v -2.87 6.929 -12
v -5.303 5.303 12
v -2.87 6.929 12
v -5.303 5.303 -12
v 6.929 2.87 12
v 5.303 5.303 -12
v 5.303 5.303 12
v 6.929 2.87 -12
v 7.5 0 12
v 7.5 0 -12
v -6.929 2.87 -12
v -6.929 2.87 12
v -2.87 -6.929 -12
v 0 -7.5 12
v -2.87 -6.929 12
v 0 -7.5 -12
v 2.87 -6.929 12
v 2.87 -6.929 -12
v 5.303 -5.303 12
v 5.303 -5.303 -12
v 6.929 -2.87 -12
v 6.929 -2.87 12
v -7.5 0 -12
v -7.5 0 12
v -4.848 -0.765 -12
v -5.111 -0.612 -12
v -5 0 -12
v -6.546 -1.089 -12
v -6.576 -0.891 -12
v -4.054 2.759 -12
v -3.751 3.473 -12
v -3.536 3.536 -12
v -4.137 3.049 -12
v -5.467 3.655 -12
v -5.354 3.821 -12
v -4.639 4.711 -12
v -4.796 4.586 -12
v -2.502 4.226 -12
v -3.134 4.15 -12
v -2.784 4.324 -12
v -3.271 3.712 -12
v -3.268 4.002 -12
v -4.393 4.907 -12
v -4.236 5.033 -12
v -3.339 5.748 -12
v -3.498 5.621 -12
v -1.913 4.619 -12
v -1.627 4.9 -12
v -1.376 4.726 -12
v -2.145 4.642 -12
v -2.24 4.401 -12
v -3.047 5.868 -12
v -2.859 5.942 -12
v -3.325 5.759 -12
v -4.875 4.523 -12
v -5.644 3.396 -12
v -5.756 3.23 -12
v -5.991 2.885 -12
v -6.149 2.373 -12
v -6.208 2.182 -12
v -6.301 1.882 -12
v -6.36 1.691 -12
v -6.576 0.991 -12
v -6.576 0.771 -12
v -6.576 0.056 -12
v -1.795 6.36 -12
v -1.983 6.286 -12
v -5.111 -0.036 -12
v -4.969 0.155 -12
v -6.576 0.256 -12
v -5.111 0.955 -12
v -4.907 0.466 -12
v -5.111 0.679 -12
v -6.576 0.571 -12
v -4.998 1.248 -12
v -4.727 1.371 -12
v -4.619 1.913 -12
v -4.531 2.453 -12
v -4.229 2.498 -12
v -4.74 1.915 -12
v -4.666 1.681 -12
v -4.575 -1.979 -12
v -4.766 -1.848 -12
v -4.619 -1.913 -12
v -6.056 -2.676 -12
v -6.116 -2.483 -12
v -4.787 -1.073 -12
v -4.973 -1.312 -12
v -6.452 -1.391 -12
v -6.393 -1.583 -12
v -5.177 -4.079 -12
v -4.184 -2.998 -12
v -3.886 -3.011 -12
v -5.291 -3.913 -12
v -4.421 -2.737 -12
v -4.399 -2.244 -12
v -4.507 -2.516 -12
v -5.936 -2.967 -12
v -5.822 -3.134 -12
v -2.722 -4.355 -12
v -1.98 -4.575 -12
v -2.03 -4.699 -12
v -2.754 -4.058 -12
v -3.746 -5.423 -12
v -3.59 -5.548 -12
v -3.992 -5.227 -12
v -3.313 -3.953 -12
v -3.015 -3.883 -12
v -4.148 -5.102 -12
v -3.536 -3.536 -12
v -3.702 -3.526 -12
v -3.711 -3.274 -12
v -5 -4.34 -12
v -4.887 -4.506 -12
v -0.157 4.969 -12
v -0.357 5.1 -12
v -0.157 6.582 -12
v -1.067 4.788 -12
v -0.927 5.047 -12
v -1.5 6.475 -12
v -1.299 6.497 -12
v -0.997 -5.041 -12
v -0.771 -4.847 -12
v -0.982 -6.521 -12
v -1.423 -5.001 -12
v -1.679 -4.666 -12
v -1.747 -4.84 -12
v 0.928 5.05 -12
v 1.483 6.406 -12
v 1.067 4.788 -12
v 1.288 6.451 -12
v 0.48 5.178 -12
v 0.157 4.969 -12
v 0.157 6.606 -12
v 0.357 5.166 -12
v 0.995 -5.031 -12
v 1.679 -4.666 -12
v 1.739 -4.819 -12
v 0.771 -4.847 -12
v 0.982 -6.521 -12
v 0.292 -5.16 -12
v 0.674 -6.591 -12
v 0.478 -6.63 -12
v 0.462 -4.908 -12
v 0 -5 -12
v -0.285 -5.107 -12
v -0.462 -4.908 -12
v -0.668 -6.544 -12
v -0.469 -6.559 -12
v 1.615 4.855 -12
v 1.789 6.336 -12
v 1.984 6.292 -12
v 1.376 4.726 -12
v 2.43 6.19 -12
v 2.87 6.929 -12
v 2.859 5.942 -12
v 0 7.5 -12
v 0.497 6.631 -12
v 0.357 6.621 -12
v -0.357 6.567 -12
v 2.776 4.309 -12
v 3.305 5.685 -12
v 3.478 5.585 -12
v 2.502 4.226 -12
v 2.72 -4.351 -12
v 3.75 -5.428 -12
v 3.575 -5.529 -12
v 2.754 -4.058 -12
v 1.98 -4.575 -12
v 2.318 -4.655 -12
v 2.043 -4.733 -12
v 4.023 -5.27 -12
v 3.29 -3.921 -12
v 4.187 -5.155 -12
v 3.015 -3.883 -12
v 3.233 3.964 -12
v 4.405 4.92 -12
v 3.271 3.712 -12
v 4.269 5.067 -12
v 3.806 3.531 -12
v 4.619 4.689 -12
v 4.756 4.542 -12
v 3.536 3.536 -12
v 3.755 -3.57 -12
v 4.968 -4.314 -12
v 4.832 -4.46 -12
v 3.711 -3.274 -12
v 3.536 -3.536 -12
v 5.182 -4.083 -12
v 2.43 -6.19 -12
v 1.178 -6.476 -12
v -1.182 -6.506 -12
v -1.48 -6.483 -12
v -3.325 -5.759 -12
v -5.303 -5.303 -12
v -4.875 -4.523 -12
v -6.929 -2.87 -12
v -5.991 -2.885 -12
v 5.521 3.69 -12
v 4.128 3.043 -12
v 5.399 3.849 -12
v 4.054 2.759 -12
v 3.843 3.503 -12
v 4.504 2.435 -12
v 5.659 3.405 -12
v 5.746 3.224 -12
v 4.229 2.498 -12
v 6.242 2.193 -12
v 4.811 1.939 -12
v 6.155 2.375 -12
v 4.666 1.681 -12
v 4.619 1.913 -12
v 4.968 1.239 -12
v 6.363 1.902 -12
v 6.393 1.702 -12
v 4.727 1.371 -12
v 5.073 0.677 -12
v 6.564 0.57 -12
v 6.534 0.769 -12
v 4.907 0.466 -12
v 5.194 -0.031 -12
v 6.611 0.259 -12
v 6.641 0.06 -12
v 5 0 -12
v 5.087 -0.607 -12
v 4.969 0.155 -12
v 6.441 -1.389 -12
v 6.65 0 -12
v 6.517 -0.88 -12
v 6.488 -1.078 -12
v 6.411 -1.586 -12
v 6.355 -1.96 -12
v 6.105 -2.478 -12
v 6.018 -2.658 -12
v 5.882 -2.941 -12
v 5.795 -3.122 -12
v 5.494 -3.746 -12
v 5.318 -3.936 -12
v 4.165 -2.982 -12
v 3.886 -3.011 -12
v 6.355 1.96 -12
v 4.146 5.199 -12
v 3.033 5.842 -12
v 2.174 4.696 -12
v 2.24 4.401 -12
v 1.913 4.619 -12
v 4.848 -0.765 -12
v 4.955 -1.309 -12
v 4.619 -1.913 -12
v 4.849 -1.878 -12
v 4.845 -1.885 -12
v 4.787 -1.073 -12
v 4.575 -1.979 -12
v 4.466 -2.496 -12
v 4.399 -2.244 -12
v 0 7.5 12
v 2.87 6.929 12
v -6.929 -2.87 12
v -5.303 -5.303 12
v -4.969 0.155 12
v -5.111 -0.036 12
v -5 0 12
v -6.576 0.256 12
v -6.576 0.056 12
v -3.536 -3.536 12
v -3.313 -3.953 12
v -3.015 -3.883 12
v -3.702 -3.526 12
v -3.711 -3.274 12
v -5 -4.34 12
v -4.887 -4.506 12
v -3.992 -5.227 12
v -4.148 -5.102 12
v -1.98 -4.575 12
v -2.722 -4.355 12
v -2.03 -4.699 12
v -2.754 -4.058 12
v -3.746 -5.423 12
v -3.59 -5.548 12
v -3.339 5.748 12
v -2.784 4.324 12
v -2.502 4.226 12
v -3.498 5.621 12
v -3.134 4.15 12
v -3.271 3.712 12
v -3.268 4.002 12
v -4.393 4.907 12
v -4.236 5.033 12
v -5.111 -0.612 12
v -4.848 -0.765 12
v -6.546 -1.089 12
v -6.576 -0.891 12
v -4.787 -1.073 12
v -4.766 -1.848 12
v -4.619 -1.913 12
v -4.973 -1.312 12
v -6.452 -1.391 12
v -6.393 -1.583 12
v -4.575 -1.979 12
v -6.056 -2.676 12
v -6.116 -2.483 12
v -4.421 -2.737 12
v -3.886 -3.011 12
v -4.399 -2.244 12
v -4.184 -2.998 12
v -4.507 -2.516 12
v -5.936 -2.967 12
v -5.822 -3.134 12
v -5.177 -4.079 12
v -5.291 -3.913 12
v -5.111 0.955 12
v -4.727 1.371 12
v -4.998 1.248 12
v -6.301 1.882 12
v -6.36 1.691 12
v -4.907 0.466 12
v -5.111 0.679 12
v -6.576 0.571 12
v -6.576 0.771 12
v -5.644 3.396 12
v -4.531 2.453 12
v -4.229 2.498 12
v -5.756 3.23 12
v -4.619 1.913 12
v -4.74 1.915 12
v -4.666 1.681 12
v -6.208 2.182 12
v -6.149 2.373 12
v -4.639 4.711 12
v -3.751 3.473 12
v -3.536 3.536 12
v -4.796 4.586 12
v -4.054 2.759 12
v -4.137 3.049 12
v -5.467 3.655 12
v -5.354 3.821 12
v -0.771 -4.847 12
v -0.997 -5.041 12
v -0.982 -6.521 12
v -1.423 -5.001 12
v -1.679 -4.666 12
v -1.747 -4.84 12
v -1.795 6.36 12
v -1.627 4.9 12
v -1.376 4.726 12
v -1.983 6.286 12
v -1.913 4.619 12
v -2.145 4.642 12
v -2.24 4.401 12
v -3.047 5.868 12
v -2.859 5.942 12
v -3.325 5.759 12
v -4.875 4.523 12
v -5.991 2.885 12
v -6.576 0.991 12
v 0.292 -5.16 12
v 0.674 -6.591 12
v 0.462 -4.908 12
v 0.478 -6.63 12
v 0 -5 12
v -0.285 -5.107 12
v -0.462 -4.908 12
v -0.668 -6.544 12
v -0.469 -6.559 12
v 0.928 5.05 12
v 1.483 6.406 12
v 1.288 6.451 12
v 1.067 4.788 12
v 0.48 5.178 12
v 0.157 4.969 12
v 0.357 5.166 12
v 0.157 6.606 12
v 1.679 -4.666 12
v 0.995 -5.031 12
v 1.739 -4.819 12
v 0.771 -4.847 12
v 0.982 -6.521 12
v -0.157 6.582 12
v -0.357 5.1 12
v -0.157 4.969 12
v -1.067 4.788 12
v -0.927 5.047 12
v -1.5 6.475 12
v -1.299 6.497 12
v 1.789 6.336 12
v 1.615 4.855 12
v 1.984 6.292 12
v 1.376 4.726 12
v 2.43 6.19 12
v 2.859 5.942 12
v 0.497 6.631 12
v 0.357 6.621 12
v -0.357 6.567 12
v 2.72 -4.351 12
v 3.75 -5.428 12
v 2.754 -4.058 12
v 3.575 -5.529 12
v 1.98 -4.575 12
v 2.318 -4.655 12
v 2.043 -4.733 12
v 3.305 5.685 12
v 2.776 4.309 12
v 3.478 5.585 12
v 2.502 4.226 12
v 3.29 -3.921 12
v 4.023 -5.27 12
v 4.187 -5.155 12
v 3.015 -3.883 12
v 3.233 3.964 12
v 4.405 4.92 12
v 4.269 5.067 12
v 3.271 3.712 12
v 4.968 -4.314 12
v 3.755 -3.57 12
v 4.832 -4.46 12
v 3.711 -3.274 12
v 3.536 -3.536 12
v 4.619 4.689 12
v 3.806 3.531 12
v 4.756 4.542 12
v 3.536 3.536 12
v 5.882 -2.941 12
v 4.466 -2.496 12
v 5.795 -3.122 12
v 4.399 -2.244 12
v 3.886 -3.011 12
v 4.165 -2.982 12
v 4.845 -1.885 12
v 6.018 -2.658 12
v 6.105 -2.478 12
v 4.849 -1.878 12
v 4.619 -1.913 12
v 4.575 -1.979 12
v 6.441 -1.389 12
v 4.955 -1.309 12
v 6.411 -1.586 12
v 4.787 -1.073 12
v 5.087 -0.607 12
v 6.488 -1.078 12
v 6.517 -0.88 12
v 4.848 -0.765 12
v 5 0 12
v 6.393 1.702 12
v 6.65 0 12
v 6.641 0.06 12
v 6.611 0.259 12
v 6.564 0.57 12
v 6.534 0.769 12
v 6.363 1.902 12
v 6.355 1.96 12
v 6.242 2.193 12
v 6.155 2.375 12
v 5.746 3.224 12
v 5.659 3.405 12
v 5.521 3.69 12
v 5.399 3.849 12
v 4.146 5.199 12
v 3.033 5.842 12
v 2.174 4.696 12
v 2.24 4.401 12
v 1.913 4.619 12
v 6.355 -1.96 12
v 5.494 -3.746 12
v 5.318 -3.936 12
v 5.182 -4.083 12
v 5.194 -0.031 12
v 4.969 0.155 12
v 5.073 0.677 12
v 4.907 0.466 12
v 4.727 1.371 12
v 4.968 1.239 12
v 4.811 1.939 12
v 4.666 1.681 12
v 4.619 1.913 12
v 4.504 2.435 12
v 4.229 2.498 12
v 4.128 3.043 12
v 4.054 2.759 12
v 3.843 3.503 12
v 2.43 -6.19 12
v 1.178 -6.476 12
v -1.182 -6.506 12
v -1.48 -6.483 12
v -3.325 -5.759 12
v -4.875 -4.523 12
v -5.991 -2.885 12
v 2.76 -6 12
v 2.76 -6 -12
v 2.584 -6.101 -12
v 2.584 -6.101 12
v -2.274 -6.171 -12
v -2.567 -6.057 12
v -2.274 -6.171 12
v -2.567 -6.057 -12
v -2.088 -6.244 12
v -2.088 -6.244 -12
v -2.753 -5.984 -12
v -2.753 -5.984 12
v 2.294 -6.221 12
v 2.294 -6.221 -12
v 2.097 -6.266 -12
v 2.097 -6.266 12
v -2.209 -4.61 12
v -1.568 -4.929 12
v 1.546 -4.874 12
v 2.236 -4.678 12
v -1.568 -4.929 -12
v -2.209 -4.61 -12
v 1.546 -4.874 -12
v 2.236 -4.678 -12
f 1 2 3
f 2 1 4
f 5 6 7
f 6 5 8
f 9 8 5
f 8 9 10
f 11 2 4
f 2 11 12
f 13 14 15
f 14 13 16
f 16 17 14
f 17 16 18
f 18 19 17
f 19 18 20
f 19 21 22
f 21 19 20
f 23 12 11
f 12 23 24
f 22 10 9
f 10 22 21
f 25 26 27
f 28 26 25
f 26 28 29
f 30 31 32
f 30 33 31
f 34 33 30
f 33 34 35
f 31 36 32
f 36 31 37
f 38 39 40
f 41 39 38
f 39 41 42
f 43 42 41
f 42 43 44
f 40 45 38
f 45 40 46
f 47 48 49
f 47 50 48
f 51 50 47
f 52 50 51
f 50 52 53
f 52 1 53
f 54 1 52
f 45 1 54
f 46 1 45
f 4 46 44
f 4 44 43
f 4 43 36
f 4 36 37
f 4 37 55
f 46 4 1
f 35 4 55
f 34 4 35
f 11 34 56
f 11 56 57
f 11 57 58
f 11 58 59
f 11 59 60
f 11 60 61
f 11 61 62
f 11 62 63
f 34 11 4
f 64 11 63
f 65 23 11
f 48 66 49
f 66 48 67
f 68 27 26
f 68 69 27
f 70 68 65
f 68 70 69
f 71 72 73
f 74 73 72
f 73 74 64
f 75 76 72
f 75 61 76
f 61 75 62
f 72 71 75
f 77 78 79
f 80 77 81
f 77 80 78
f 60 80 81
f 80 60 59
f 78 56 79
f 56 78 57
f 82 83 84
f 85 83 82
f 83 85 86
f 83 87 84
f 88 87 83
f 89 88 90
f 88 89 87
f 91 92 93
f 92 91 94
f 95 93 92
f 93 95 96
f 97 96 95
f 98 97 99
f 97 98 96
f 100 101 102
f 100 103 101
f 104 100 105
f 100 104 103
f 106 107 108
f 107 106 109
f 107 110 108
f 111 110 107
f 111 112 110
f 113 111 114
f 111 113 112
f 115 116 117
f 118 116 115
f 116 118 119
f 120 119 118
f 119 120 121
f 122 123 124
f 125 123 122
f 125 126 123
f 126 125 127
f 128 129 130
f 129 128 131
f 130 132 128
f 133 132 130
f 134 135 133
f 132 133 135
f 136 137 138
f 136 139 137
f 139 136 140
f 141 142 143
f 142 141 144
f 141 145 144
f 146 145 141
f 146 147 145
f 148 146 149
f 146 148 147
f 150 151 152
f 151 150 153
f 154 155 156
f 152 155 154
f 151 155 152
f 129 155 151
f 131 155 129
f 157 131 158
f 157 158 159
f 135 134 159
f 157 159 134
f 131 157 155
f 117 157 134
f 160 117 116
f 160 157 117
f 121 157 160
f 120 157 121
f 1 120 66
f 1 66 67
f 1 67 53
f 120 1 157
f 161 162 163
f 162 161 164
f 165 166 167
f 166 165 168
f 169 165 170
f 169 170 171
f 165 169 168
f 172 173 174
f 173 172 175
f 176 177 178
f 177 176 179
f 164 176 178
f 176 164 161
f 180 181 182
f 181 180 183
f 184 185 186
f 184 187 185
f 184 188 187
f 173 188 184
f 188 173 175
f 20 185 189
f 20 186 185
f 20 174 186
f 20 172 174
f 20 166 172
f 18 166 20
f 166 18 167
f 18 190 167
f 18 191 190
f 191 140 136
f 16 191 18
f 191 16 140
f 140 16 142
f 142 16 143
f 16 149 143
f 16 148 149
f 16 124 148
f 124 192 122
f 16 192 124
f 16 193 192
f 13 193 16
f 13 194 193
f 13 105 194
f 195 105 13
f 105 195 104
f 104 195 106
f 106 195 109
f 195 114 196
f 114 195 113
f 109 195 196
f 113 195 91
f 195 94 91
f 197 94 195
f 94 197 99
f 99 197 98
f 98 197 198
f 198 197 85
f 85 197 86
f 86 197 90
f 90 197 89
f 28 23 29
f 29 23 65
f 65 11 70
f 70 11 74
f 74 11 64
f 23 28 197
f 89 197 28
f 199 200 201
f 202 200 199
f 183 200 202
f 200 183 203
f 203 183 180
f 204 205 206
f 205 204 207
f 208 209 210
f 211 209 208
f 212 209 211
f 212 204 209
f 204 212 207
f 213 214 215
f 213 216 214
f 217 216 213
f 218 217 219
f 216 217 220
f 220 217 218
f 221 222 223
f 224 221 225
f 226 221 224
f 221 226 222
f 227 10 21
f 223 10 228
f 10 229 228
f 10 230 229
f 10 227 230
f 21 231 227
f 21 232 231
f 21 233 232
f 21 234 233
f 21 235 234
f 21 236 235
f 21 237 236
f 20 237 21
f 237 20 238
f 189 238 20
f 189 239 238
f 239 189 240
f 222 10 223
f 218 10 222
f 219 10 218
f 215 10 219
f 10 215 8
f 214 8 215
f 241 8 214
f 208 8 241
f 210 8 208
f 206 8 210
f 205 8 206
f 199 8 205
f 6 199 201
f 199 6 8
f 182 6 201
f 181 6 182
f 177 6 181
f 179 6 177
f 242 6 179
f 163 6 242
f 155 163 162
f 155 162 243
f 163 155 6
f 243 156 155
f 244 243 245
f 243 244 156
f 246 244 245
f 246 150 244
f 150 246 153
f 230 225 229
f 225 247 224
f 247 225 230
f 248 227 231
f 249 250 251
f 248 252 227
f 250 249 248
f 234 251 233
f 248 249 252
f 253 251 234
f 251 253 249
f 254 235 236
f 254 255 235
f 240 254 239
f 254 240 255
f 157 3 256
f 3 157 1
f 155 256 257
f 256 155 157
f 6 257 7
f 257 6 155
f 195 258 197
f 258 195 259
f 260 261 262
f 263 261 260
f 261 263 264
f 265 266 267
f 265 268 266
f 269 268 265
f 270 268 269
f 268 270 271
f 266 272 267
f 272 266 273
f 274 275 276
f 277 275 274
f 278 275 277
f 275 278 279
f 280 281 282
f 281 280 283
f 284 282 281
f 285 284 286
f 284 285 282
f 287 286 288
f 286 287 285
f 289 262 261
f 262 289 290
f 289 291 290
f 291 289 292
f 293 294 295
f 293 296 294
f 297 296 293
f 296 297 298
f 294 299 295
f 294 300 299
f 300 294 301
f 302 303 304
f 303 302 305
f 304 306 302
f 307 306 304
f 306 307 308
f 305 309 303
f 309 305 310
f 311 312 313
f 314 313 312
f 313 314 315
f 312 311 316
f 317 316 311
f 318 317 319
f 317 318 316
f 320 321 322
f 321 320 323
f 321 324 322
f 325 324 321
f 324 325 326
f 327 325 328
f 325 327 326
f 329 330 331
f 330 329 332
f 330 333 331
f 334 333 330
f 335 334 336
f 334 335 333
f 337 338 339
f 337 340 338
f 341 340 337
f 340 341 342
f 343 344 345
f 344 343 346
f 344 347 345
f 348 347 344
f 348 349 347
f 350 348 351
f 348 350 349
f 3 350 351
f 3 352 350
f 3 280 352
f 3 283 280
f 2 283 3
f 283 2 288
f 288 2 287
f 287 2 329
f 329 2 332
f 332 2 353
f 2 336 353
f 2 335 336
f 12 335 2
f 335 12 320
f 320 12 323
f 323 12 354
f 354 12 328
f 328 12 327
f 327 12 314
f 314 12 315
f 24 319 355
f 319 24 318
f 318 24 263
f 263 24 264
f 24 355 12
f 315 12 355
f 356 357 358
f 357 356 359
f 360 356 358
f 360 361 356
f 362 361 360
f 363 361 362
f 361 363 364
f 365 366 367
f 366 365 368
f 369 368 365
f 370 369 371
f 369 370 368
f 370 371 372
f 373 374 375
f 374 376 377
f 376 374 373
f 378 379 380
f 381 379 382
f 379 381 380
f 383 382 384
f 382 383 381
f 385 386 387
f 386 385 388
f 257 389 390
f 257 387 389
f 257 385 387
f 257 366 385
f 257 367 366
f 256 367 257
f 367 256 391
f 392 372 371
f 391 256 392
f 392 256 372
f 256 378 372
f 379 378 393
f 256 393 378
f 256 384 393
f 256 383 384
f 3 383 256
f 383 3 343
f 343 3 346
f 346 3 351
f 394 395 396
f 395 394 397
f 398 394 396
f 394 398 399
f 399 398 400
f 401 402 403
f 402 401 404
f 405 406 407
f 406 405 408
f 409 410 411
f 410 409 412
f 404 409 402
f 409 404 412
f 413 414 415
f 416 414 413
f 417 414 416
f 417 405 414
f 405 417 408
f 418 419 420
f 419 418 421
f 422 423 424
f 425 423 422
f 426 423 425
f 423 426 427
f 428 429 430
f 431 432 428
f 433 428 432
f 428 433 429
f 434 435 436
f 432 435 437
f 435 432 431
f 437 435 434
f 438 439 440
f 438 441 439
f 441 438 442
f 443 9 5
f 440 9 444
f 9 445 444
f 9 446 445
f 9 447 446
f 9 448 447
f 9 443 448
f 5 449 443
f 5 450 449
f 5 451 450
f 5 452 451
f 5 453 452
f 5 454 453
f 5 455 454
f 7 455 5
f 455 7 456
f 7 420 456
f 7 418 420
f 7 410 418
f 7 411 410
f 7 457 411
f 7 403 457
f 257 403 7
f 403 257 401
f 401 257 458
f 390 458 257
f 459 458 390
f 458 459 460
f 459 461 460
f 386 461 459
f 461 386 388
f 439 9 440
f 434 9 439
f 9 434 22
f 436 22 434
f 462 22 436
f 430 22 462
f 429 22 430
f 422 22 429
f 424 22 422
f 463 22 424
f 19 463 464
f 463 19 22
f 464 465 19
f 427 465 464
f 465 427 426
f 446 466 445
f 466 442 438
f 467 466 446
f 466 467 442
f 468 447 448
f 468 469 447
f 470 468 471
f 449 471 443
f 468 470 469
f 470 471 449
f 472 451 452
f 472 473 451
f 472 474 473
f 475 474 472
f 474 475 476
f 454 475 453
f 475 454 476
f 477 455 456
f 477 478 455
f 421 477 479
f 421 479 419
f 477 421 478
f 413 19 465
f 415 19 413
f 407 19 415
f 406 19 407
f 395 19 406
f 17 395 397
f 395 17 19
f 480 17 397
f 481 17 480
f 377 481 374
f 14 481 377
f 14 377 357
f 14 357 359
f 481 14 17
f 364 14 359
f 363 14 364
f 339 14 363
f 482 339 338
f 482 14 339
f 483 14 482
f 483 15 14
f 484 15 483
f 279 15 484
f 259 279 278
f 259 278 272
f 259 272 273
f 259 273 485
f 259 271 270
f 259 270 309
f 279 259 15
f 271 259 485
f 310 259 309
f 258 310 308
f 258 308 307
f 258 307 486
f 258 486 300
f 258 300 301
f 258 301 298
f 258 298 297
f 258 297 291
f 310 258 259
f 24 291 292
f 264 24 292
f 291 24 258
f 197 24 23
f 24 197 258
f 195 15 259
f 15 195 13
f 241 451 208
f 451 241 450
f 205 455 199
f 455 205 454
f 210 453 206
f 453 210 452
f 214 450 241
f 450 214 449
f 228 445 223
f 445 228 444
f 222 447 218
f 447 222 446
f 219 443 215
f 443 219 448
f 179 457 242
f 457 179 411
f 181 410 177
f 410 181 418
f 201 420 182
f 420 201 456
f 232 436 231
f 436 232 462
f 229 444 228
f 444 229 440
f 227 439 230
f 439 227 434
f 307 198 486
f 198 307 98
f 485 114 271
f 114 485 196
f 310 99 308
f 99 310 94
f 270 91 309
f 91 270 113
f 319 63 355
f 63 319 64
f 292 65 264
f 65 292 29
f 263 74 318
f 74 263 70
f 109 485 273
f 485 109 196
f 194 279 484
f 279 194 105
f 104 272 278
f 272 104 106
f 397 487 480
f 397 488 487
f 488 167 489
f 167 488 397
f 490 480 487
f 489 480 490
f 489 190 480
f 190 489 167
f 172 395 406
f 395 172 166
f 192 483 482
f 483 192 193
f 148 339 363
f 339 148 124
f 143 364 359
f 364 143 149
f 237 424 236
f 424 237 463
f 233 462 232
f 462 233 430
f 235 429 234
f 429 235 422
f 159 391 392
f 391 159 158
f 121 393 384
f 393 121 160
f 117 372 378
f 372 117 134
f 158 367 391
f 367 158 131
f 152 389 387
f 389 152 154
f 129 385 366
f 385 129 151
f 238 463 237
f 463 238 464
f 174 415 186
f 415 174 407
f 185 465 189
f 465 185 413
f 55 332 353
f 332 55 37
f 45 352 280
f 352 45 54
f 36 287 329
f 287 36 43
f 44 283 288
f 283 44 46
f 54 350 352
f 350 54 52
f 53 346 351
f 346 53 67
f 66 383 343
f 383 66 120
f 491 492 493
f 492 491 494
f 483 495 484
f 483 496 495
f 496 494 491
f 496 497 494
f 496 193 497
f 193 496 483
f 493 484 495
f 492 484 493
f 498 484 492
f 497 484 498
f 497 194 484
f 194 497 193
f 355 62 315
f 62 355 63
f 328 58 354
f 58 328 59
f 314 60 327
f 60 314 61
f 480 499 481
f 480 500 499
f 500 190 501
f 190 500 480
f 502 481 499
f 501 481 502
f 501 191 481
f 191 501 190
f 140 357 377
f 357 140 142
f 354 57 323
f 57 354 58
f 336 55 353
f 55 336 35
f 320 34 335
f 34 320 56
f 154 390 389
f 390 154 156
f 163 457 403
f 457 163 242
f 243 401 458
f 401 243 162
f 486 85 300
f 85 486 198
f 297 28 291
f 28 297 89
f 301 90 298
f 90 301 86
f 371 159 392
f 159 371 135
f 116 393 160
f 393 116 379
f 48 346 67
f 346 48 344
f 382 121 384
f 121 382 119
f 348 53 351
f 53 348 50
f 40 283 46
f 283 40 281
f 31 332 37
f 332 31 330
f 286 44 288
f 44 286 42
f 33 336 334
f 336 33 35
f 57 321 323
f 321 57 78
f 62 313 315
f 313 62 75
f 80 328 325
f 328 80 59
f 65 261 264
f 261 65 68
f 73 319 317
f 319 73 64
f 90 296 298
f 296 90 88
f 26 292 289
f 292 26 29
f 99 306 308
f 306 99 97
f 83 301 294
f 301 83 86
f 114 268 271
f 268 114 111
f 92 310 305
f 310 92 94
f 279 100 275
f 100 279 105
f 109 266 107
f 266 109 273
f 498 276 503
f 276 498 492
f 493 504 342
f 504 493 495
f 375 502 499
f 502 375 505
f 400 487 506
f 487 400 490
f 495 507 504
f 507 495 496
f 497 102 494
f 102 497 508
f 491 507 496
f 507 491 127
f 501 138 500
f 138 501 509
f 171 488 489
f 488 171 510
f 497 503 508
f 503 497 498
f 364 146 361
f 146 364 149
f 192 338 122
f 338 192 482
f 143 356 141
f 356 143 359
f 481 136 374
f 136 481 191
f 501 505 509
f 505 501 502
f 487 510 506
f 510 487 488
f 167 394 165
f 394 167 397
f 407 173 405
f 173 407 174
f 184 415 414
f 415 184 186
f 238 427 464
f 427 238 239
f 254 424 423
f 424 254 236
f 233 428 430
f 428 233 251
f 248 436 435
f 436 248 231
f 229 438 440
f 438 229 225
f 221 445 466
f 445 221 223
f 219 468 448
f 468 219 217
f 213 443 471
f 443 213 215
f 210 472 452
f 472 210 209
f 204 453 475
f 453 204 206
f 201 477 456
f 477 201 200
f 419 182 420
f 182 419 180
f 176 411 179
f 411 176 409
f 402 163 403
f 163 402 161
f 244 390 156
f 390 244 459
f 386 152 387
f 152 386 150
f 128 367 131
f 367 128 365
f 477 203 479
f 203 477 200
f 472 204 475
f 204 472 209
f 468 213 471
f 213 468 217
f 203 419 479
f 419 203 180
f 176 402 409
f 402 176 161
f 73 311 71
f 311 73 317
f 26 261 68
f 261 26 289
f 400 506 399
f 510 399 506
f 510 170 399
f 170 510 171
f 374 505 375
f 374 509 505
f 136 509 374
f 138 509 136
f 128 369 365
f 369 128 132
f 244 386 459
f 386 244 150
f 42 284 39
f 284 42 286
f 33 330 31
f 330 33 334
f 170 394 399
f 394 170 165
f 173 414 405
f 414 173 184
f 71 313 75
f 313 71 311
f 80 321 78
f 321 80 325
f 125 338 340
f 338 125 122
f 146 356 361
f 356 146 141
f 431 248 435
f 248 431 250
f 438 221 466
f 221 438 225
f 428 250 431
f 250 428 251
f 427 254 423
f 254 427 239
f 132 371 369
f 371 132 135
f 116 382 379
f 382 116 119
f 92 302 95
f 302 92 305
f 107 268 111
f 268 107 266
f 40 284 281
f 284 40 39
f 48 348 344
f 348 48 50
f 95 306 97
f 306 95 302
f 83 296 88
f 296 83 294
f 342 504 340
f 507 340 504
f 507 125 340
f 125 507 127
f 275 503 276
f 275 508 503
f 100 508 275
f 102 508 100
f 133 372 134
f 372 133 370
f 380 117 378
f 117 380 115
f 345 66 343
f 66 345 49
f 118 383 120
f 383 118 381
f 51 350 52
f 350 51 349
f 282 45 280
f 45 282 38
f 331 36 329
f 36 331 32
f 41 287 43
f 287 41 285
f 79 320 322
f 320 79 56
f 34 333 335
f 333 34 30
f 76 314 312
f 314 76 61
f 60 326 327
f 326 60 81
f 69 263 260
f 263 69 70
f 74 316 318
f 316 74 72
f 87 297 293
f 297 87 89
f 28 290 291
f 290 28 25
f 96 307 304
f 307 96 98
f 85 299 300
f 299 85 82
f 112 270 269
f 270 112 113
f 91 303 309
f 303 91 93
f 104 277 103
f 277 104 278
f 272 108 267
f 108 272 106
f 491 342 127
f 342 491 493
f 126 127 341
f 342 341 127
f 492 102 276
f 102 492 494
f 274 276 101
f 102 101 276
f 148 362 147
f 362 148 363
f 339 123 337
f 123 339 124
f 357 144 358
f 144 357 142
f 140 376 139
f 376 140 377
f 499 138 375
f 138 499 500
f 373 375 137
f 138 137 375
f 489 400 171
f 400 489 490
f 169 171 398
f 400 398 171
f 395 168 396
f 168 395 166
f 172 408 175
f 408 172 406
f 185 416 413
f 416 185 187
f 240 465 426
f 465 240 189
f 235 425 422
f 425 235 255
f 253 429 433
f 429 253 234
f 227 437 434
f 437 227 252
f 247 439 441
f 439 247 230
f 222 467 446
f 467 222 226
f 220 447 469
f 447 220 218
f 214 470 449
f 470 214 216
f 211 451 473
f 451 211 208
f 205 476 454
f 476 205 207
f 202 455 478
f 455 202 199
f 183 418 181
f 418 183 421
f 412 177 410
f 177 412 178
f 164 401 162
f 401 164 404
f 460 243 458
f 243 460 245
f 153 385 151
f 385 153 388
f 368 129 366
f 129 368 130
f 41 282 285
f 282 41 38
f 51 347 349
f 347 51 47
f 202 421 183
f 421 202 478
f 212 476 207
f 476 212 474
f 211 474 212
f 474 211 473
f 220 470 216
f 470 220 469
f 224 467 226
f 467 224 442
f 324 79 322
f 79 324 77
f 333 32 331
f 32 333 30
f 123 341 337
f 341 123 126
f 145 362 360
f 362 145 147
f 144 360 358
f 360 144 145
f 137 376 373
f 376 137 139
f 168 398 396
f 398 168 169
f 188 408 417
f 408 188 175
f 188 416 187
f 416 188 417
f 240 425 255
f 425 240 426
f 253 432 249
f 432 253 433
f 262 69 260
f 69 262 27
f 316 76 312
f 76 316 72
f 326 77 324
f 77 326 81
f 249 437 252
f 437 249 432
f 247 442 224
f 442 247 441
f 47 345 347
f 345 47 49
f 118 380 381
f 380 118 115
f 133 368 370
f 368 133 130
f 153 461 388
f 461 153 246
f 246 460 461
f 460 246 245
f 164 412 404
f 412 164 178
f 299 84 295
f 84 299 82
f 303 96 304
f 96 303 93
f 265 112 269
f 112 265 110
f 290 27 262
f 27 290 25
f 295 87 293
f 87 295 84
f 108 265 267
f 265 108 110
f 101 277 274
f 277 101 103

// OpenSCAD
/* toothedLinearBearing
 * based on  Krallinger Sebastian's 2012 model:
 * http://www.thingiverse.com/thing:18219
 * Dual-licensed under 
 * Creative Commons Attribution-ShareAlike 3.0 (CC BY-SA) [http://creativecommons.org/licenses/by-sa/3.0/]
 * and
 * GPL v2 or later [http://www.gnu.org/licenses/].
 */

//Inner Diamiter of the baring. This is the size of the rod it's to be run on, in mm
int_Inner = 10; //[8:100]
//Outer Diamiter of the baring. diffrent shapes may need bigger/smaller outer diamiters
int_Outer = 15; //[15:115]
//Length of the baring
int_Length = 24;//[100]
//printer head diamiter
dec_Dia = 0.2;
//minimum thickness of the outer wall. 
dec_wallThick = 0.85;
//number of teeth, more the better, but dont be silly
int_teeth = 25; //[100]
//coverd length of the inner ring (Im not sure exactly what this does, but it doesnt work right without it)
dec_toothRatio = 0.25;
//number of sides for the outside of the baring (3 = triange, 4 = square ect)
int_sides = 16; //[3:360]

// ************* units.scad ************* //
//thise units are used to keep everything clean
mm = 1;
cm = 10 * mm;
dm = 100 * mm;
m = 1000 * mm;

inch = 25.4 * mm;

X = [1, 0, 0];
Y = [0, 1, 0];
Z = [0, 0, 1];

M3 = 3*mm;
M4 = 4*mm;
M5 = 5*mm;
M6 = 6*mm;
M8 = 8*mm;

epsilon = 0.01*mm;
OS = epsilon;

TLB_linearBearing(int_Inner, int_Outer, int_Length, dec_Dia, dec_wallThick, int_teeth, dec_toothRatio);

module TLB_linearBearing(inner_d, outer_d, h, stringWidth, minWallThickness,	tooths, toothRatio) {
	
	stringWidth          = stringWidth; //!< the layer width of one string
	
	TLB_innerD           = inner_d;
	TLB_outerD           = outer_d;
	TLB_minWallThickness = minWallThickness;
	TLB_h                = h;
	TLB_tooths           = tooths;
	
	TLB_toothRate        = toothRatio;
	
	
	gapWidth             = (TLB_innerD*PI)/TLB_tooths *TLB_toothRate;
	//echo(str("gap Width: ", gapWidth));
	middR                = TLB_outerD/2- TLB_minWallThickness;
	
	//outer ring
	difference() {
		cylinder(r=TLB_outerD/2, h=TLB_h, center=true,$fn=int_sides);
		cylinder(r=middR, h=TLB_h+2*OS, center=true);
	}
	

	difference() {
		union(){
			cylinder(r=TLB_innerD/2 + stringWidth, h=TLB_h, center=true);

			for (i=[0:360 / TLB_tooths : 360]) {
				rotate(a=i,v=Z) translate([-(gapWidth+2*stringWidth)/2, 0, -TLB_h/2])
					cube(size=[gapWidth+2*stringWidth, middR+OS, TLB_h], center=false);
			}
		}
		union(){
			cylinder(r=TLB_innerD/2, h=TLB_h+2*OS, center=true);
			
			for (i=[0:360 / TLB_tooths : 360]) {
				rotate(a=i,v=Z) translate([-gapWidth/2, 0, -TLB_h/2-OS]) 
					cube(size=[gapWidth, middR, TLB_h+2*OS], center=false);
			}
		}
	}
}
